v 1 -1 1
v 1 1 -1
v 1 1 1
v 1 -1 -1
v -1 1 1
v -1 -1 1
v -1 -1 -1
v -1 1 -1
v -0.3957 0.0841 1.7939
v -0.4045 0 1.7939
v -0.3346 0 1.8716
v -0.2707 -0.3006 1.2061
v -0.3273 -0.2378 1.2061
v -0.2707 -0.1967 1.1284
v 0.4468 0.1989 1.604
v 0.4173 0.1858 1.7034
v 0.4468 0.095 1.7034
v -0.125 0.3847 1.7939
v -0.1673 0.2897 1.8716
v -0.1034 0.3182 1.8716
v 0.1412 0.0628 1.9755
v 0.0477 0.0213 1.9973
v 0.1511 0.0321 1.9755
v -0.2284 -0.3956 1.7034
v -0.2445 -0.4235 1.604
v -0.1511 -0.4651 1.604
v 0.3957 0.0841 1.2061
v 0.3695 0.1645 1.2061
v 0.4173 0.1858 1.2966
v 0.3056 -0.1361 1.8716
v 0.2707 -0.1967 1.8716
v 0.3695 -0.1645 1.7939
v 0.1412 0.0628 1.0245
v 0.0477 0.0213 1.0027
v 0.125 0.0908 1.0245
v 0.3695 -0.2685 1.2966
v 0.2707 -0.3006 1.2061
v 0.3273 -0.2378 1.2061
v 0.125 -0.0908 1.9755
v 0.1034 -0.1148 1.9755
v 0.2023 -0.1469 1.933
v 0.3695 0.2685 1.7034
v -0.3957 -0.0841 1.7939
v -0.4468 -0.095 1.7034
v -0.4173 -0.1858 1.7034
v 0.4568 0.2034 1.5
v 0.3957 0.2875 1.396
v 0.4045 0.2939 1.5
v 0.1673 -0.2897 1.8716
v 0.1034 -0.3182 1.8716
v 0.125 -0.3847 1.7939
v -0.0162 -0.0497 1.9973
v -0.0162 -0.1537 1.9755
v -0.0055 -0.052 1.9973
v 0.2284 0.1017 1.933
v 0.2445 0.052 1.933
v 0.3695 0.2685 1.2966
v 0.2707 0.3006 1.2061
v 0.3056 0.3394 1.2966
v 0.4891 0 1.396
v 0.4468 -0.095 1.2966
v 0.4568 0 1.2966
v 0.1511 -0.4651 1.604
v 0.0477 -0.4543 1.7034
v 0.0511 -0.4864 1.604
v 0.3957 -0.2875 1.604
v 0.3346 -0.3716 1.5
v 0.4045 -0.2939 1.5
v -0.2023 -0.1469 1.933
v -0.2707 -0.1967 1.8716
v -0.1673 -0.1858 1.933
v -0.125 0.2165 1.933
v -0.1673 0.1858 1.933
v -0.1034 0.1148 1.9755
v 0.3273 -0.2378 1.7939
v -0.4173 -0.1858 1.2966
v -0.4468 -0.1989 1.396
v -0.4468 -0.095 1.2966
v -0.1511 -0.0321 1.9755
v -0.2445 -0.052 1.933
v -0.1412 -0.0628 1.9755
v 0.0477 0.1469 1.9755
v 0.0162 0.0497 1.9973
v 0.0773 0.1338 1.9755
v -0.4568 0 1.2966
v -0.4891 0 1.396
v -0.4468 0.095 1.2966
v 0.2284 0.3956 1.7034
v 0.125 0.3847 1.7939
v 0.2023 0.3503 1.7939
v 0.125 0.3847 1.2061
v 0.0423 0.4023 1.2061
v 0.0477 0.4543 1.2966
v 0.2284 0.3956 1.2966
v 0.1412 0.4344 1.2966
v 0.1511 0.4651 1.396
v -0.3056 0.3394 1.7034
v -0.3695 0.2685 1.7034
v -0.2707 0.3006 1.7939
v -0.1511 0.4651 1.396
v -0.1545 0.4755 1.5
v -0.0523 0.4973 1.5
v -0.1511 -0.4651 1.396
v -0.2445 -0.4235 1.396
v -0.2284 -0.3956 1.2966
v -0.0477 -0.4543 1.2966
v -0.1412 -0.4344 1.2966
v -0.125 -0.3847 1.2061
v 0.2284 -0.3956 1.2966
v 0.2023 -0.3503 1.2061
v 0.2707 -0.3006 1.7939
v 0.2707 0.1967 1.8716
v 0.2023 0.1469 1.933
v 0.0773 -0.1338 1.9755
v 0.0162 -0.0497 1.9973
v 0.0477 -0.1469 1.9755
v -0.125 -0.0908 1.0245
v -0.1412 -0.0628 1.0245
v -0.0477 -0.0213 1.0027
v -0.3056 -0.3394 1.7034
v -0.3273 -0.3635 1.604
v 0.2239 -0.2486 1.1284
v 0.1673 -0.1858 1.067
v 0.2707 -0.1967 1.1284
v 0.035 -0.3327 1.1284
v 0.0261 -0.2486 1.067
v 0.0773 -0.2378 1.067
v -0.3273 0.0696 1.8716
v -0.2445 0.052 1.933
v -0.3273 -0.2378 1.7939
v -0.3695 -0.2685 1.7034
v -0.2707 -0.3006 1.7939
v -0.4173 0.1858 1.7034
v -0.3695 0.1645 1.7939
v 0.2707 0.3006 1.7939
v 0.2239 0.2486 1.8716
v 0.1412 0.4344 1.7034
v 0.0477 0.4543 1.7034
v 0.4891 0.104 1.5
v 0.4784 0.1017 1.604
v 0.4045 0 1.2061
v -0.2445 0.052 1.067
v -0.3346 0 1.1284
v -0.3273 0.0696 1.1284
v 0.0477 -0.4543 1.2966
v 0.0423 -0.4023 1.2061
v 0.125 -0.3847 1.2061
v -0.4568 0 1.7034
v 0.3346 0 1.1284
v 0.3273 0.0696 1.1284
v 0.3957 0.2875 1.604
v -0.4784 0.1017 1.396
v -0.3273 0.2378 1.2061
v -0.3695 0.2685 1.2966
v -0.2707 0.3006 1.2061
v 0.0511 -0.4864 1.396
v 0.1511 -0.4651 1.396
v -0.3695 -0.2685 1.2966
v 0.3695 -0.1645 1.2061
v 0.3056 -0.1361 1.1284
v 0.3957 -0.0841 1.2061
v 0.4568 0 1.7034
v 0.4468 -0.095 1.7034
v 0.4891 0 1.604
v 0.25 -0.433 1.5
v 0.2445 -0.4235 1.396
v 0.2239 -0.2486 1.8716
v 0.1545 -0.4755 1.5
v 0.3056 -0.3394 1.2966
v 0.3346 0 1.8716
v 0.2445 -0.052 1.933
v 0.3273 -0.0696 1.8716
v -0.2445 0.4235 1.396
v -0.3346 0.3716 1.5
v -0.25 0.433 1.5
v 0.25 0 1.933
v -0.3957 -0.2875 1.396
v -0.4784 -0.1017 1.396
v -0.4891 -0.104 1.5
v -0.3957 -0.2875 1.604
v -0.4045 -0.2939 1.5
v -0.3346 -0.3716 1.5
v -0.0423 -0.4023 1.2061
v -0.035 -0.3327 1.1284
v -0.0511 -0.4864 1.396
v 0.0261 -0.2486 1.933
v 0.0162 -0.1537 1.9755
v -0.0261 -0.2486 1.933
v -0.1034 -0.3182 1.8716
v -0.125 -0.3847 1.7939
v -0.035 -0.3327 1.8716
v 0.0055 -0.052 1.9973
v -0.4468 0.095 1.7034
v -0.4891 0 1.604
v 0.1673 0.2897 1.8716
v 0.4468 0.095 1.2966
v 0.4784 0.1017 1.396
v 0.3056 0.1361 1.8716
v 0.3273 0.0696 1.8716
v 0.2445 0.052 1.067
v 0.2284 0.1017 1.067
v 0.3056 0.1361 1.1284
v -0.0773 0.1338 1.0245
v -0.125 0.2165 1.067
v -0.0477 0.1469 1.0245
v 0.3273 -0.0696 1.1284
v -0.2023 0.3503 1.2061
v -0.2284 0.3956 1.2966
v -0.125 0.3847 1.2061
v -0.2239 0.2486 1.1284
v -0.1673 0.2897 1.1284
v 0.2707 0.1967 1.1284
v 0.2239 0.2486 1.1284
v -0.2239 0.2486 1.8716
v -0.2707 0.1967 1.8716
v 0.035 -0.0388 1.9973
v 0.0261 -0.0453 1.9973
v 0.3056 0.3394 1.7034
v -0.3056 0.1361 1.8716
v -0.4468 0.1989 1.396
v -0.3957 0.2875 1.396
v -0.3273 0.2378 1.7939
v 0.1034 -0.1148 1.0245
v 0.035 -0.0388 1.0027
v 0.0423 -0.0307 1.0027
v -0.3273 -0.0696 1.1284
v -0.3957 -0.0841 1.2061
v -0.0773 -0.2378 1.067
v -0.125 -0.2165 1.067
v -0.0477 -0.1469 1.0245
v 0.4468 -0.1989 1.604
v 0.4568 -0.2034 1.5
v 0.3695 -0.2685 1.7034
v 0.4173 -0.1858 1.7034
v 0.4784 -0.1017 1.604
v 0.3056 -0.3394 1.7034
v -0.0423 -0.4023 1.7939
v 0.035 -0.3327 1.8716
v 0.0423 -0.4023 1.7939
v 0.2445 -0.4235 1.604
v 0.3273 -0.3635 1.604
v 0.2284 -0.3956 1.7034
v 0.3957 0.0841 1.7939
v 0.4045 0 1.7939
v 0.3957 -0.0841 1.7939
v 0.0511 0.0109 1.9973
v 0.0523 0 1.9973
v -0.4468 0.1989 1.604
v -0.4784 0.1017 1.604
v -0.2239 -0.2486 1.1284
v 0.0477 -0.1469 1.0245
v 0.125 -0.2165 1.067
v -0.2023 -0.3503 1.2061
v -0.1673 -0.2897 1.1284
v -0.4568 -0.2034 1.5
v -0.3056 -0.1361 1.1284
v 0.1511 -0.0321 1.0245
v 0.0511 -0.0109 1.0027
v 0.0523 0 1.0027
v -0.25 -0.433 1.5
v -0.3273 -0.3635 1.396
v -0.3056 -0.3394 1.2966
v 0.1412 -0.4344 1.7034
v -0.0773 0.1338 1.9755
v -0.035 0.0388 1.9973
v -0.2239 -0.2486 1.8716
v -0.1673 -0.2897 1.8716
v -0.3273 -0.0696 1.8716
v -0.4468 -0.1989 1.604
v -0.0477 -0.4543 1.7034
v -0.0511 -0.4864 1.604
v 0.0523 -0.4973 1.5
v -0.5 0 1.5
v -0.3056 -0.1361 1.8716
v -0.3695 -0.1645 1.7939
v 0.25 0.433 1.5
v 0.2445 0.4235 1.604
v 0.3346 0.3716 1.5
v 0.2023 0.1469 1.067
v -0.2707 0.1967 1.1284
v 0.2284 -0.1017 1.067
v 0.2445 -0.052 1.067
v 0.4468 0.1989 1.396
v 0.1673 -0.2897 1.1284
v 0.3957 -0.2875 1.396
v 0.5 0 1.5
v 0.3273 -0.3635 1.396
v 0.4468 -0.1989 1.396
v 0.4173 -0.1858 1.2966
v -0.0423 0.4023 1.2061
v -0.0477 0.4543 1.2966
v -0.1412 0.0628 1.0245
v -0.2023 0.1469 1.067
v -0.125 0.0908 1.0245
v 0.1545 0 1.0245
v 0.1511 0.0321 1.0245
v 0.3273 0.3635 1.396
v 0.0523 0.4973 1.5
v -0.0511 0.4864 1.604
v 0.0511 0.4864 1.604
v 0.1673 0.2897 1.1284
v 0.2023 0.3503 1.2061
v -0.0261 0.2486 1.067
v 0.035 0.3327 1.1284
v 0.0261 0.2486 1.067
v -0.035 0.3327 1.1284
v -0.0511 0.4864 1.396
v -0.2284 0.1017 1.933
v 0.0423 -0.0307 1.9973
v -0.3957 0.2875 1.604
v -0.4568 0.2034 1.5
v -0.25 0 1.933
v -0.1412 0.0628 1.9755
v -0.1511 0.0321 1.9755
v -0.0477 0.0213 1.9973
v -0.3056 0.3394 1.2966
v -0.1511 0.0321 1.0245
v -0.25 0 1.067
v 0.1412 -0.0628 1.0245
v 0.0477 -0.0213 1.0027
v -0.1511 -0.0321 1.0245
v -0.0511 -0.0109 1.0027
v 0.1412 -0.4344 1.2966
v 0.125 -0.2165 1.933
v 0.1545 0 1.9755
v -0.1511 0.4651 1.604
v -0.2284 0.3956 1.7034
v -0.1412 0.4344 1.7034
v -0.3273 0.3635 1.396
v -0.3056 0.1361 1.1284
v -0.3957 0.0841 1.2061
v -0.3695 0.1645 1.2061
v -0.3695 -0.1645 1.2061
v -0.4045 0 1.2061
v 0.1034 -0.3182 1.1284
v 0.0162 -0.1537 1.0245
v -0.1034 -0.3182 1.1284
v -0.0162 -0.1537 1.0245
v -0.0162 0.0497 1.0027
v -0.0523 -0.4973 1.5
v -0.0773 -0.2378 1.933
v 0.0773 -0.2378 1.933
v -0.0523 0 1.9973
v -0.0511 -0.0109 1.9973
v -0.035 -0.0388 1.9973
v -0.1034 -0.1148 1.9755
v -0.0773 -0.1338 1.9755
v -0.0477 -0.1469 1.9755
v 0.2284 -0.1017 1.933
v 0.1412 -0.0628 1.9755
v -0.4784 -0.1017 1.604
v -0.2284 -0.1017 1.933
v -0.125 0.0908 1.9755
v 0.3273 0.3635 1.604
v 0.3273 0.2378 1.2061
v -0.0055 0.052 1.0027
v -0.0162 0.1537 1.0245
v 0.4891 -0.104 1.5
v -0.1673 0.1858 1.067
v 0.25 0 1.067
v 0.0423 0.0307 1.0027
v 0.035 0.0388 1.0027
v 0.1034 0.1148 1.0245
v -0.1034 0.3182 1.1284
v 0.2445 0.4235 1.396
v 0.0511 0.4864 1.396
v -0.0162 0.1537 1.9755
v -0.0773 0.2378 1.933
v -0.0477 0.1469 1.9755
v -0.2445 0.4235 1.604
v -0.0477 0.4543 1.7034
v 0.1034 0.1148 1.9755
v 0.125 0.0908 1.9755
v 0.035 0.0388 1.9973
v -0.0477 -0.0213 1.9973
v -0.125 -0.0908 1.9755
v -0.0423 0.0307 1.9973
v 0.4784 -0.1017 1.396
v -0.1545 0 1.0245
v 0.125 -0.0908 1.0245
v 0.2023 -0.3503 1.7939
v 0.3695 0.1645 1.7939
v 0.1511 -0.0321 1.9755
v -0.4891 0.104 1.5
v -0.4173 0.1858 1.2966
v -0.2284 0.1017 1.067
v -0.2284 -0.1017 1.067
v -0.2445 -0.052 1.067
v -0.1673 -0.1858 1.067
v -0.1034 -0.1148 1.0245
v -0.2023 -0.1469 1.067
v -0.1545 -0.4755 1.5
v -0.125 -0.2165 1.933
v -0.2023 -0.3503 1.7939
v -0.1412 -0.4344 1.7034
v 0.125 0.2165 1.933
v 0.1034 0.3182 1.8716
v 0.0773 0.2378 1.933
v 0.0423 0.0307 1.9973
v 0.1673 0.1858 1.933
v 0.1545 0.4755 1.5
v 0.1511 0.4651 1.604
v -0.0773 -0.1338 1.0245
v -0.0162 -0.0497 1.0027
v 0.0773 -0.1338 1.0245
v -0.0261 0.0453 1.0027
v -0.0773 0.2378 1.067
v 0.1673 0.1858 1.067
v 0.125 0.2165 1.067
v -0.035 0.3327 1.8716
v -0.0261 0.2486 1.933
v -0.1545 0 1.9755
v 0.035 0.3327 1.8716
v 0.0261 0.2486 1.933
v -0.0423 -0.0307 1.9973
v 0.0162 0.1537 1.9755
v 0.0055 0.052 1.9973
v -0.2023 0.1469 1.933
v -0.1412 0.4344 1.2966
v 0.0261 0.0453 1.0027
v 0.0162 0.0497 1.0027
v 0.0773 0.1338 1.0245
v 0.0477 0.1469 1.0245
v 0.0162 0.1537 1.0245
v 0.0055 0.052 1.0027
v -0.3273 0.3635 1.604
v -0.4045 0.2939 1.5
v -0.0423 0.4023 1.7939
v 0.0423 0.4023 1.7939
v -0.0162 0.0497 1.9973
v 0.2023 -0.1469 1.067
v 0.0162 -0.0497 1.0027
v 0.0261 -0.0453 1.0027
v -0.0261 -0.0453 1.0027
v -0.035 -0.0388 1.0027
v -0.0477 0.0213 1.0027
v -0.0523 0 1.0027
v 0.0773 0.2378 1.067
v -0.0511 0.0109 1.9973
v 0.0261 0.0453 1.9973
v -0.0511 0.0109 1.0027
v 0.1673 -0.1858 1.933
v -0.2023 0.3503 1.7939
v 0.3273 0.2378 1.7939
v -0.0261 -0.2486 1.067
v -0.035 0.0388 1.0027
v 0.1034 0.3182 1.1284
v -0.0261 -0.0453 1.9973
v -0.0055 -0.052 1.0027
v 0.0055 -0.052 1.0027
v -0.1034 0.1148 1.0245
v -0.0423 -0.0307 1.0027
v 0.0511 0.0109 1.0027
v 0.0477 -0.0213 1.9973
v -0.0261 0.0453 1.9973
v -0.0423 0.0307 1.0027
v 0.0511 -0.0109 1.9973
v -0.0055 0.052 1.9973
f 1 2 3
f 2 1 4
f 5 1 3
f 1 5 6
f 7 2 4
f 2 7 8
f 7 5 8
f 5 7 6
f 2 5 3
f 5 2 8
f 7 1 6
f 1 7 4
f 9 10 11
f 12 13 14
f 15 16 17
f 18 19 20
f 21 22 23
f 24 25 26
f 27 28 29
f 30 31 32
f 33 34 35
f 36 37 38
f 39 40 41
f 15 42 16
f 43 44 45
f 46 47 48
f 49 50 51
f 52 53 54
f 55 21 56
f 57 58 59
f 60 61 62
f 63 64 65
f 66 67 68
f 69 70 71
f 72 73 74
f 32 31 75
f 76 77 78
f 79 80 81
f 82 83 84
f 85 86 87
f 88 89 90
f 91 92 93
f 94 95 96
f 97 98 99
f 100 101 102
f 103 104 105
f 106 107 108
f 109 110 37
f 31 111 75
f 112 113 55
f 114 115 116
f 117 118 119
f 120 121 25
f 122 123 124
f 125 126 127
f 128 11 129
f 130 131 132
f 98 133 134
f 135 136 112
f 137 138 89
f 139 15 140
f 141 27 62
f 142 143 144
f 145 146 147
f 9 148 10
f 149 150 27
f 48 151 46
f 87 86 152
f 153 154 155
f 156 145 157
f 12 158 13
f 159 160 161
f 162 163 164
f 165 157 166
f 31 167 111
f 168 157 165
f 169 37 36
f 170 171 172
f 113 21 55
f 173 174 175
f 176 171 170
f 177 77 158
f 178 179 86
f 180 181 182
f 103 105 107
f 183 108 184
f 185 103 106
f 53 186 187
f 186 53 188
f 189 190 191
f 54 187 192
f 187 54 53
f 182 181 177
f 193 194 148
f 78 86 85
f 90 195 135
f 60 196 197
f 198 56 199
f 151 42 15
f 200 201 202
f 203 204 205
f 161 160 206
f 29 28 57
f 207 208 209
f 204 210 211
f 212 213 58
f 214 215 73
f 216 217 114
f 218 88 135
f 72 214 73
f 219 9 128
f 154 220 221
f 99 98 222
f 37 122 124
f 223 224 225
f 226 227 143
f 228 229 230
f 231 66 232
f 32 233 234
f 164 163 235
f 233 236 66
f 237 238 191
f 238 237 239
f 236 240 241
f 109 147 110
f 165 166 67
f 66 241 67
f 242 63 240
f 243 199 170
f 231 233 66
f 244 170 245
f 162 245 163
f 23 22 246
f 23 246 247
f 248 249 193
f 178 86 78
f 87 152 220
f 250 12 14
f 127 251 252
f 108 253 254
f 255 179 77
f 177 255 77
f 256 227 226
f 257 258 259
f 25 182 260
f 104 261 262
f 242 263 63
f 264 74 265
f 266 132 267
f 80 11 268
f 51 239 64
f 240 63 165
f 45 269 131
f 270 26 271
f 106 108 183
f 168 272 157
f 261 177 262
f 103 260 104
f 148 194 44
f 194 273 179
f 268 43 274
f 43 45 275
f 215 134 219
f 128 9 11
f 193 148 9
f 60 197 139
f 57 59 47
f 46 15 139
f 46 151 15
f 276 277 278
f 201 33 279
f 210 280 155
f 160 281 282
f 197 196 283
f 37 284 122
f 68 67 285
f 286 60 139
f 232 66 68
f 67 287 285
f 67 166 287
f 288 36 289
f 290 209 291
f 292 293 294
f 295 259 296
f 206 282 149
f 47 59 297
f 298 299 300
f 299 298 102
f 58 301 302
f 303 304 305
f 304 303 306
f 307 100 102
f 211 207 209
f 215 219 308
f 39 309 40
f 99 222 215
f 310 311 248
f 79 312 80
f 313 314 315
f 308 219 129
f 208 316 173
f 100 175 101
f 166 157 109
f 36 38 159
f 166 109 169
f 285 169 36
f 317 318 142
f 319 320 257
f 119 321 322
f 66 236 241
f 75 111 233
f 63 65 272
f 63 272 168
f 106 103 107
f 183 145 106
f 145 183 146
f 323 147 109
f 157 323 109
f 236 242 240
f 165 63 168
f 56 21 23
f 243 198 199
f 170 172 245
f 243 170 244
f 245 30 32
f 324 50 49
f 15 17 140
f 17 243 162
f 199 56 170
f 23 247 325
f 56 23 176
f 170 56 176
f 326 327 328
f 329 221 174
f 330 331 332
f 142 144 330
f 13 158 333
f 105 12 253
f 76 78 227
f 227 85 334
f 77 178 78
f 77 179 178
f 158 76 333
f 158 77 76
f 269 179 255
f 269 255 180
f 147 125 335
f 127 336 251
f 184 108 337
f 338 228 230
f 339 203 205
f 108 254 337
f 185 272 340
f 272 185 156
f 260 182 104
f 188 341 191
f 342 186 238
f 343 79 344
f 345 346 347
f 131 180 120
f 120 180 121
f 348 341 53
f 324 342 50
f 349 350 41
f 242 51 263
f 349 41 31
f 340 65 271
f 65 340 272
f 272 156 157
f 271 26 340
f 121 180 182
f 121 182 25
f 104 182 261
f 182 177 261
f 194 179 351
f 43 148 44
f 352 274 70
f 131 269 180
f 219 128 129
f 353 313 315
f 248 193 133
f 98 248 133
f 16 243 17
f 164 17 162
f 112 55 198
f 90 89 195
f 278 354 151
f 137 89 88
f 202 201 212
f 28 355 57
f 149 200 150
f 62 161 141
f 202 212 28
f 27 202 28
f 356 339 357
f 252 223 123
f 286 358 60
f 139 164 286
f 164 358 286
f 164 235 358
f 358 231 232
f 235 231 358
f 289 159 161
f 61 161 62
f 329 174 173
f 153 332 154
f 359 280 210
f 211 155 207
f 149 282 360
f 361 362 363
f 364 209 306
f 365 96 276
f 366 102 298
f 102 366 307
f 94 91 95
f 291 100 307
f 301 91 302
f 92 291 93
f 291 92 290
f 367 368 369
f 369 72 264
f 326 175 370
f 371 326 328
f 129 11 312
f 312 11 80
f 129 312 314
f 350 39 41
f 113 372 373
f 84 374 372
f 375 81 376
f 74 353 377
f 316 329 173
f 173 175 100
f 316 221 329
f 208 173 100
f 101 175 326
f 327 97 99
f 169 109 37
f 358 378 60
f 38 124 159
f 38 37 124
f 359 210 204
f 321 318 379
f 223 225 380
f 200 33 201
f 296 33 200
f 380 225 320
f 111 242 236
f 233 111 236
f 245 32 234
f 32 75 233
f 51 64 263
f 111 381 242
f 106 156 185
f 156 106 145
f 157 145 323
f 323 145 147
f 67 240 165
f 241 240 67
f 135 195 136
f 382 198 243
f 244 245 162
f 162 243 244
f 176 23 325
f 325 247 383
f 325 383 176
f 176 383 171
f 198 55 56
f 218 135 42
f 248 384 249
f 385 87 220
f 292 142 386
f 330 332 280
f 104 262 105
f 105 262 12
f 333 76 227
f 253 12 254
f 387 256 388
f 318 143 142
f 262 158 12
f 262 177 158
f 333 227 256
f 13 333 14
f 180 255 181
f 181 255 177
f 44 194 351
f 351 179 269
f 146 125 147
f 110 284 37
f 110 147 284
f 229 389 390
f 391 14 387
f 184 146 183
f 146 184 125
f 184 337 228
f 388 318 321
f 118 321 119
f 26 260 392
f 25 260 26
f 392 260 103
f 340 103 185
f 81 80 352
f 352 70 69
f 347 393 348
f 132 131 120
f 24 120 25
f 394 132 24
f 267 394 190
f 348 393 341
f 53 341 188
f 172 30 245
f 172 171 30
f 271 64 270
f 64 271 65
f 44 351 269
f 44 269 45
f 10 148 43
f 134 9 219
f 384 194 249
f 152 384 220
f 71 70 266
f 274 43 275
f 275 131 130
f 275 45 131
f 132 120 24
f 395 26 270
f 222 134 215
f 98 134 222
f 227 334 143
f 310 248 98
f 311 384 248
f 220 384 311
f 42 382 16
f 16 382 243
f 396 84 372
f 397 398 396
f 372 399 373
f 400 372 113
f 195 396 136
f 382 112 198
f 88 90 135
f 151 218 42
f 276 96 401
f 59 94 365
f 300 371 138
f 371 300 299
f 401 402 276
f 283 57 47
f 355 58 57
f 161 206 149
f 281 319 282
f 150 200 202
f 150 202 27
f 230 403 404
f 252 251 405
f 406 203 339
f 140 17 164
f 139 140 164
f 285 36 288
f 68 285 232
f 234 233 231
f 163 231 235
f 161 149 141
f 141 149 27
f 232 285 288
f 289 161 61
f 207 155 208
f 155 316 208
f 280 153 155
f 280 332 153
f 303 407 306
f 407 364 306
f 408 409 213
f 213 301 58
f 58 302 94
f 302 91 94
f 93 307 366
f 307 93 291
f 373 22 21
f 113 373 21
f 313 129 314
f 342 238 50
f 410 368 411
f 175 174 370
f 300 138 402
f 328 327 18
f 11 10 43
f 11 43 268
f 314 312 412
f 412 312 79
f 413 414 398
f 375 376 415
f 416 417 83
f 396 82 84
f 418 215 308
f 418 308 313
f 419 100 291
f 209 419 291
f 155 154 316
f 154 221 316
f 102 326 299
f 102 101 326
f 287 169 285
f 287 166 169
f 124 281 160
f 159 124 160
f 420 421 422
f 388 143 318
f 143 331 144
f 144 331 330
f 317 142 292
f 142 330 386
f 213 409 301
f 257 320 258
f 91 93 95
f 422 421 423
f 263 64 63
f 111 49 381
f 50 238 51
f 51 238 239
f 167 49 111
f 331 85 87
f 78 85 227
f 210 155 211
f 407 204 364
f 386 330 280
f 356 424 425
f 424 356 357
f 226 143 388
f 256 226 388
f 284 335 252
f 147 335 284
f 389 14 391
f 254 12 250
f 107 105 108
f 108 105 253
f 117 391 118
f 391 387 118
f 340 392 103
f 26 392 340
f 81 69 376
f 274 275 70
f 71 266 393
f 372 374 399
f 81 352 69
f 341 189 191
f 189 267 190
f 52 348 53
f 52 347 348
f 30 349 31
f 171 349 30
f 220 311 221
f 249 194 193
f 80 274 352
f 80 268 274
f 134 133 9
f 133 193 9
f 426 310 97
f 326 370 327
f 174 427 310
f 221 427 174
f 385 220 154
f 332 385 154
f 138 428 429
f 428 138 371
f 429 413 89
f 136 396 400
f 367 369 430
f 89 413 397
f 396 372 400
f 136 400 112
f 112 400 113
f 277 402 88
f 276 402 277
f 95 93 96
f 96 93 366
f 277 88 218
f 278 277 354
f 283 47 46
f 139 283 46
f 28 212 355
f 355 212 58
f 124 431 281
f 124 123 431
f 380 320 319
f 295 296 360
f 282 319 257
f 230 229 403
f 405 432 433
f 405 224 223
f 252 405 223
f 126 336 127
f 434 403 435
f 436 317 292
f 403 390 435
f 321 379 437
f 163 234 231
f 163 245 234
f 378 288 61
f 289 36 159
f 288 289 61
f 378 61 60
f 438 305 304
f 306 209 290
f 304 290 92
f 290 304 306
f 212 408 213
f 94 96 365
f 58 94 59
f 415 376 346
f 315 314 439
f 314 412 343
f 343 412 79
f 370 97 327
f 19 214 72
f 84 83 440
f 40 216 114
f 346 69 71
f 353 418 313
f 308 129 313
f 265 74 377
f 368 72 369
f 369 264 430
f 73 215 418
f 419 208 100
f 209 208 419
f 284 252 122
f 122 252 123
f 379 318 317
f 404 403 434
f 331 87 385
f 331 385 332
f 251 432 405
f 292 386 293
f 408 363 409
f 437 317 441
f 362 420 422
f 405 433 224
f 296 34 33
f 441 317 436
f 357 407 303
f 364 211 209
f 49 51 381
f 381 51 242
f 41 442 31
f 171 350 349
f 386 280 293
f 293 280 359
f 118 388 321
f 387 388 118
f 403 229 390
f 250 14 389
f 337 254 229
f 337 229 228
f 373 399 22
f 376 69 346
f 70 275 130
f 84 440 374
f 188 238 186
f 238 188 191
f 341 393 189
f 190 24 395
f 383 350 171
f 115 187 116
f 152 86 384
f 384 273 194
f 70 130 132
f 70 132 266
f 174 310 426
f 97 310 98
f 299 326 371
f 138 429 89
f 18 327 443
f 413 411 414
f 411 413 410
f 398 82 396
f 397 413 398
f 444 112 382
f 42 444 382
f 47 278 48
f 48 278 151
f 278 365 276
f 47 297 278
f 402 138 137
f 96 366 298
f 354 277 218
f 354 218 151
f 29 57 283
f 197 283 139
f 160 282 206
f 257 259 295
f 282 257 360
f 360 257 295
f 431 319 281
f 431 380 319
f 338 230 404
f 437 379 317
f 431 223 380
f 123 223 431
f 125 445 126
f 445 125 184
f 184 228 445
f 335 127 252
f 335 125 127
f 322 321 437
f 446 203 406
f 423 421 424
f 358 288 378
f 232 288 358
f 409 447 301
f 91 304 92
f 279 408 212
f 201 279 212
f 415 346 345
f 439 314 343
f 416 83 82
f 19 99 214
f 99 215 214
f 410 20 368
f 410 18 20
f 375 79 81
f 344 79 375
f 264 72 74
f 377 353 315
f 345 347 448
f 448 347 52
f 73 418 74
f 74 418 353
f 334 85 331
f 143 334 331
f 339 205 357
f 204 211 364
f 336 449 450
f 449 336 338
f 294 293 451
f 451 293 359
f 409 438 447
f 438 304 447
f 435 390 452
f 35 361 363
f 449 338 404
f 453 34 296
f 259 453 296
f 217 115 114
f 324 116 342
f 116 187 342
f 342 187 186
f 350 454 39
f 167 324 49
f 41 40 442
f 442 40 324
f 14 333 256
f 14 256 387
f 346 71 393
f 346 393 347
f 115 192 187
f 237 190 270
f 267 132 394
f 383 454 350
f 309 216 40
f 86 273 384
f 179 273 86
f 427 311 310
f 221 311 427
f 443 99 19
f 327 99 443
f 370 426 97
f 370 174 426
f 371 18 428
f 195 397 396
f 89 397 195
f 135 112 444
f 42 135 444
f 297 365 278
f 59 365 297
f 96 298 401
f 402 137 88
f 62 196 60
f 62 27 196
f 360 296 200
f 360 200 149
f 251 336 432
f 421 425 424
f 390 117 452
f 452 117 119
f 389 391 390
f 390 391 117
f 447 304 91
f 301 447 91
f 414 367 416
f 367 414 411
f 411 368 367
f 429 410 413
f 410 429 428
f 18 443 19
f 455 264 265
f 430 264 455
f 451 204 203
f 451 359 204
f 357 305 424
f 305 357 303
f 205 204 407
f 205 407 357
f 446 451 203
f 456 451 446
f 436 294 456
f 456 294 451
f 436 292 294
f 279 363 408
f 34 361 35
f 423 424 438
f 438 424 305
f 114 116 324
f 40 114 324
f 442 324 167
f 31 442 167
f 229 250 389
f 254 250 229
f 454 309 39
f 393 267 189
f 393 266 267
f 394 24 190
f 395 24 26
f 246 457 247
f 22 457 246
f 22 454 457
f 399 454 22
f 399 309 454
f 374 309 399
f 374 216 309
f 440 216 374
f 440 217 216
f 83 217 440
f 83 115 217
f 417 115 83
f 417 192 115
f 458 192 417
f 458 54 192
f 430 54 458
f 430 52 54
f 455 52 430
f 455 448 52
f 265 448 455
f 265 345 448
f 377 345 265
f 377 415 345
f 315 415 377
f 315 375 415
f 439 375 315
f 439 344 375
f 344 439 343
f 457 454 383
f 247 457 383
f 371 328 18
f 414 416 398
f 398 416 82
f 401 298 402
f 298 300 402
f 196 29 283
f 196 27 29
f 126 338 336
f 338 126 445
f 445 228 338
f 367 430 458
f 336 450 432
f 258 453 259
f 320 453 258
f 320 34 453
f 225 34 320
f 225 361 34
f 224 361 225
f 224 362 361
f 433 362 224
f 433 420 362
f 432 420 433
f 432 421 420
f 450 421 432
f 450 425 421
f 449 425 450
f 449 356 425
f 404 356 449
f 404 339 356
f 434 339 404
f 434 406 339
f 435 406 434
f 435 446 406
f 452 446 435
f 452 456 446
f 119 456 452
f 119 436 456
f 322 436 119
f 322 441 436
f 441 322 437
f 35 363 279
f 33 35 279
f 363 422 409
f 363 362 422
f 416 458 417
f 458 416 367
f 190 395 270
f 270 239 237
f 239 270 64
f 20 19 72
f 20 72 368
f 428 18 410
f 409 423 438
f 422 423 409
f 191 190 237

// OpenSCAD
$fn=30;

// Orange Cube
color("orange") {
    cube([2, 2, 2], center=true);
}

// Blue Sphere
color("blue") {
    translate([0, 0, 1 + 0.5]) // Move the sphere on top of the cube. The cube is 2mm high, and we add half the sphere's diameter (0.5mm) to position it on top.
    sphere(0.5); // Sphere diameter is 1mm, so radius is 0.5mm.
}
